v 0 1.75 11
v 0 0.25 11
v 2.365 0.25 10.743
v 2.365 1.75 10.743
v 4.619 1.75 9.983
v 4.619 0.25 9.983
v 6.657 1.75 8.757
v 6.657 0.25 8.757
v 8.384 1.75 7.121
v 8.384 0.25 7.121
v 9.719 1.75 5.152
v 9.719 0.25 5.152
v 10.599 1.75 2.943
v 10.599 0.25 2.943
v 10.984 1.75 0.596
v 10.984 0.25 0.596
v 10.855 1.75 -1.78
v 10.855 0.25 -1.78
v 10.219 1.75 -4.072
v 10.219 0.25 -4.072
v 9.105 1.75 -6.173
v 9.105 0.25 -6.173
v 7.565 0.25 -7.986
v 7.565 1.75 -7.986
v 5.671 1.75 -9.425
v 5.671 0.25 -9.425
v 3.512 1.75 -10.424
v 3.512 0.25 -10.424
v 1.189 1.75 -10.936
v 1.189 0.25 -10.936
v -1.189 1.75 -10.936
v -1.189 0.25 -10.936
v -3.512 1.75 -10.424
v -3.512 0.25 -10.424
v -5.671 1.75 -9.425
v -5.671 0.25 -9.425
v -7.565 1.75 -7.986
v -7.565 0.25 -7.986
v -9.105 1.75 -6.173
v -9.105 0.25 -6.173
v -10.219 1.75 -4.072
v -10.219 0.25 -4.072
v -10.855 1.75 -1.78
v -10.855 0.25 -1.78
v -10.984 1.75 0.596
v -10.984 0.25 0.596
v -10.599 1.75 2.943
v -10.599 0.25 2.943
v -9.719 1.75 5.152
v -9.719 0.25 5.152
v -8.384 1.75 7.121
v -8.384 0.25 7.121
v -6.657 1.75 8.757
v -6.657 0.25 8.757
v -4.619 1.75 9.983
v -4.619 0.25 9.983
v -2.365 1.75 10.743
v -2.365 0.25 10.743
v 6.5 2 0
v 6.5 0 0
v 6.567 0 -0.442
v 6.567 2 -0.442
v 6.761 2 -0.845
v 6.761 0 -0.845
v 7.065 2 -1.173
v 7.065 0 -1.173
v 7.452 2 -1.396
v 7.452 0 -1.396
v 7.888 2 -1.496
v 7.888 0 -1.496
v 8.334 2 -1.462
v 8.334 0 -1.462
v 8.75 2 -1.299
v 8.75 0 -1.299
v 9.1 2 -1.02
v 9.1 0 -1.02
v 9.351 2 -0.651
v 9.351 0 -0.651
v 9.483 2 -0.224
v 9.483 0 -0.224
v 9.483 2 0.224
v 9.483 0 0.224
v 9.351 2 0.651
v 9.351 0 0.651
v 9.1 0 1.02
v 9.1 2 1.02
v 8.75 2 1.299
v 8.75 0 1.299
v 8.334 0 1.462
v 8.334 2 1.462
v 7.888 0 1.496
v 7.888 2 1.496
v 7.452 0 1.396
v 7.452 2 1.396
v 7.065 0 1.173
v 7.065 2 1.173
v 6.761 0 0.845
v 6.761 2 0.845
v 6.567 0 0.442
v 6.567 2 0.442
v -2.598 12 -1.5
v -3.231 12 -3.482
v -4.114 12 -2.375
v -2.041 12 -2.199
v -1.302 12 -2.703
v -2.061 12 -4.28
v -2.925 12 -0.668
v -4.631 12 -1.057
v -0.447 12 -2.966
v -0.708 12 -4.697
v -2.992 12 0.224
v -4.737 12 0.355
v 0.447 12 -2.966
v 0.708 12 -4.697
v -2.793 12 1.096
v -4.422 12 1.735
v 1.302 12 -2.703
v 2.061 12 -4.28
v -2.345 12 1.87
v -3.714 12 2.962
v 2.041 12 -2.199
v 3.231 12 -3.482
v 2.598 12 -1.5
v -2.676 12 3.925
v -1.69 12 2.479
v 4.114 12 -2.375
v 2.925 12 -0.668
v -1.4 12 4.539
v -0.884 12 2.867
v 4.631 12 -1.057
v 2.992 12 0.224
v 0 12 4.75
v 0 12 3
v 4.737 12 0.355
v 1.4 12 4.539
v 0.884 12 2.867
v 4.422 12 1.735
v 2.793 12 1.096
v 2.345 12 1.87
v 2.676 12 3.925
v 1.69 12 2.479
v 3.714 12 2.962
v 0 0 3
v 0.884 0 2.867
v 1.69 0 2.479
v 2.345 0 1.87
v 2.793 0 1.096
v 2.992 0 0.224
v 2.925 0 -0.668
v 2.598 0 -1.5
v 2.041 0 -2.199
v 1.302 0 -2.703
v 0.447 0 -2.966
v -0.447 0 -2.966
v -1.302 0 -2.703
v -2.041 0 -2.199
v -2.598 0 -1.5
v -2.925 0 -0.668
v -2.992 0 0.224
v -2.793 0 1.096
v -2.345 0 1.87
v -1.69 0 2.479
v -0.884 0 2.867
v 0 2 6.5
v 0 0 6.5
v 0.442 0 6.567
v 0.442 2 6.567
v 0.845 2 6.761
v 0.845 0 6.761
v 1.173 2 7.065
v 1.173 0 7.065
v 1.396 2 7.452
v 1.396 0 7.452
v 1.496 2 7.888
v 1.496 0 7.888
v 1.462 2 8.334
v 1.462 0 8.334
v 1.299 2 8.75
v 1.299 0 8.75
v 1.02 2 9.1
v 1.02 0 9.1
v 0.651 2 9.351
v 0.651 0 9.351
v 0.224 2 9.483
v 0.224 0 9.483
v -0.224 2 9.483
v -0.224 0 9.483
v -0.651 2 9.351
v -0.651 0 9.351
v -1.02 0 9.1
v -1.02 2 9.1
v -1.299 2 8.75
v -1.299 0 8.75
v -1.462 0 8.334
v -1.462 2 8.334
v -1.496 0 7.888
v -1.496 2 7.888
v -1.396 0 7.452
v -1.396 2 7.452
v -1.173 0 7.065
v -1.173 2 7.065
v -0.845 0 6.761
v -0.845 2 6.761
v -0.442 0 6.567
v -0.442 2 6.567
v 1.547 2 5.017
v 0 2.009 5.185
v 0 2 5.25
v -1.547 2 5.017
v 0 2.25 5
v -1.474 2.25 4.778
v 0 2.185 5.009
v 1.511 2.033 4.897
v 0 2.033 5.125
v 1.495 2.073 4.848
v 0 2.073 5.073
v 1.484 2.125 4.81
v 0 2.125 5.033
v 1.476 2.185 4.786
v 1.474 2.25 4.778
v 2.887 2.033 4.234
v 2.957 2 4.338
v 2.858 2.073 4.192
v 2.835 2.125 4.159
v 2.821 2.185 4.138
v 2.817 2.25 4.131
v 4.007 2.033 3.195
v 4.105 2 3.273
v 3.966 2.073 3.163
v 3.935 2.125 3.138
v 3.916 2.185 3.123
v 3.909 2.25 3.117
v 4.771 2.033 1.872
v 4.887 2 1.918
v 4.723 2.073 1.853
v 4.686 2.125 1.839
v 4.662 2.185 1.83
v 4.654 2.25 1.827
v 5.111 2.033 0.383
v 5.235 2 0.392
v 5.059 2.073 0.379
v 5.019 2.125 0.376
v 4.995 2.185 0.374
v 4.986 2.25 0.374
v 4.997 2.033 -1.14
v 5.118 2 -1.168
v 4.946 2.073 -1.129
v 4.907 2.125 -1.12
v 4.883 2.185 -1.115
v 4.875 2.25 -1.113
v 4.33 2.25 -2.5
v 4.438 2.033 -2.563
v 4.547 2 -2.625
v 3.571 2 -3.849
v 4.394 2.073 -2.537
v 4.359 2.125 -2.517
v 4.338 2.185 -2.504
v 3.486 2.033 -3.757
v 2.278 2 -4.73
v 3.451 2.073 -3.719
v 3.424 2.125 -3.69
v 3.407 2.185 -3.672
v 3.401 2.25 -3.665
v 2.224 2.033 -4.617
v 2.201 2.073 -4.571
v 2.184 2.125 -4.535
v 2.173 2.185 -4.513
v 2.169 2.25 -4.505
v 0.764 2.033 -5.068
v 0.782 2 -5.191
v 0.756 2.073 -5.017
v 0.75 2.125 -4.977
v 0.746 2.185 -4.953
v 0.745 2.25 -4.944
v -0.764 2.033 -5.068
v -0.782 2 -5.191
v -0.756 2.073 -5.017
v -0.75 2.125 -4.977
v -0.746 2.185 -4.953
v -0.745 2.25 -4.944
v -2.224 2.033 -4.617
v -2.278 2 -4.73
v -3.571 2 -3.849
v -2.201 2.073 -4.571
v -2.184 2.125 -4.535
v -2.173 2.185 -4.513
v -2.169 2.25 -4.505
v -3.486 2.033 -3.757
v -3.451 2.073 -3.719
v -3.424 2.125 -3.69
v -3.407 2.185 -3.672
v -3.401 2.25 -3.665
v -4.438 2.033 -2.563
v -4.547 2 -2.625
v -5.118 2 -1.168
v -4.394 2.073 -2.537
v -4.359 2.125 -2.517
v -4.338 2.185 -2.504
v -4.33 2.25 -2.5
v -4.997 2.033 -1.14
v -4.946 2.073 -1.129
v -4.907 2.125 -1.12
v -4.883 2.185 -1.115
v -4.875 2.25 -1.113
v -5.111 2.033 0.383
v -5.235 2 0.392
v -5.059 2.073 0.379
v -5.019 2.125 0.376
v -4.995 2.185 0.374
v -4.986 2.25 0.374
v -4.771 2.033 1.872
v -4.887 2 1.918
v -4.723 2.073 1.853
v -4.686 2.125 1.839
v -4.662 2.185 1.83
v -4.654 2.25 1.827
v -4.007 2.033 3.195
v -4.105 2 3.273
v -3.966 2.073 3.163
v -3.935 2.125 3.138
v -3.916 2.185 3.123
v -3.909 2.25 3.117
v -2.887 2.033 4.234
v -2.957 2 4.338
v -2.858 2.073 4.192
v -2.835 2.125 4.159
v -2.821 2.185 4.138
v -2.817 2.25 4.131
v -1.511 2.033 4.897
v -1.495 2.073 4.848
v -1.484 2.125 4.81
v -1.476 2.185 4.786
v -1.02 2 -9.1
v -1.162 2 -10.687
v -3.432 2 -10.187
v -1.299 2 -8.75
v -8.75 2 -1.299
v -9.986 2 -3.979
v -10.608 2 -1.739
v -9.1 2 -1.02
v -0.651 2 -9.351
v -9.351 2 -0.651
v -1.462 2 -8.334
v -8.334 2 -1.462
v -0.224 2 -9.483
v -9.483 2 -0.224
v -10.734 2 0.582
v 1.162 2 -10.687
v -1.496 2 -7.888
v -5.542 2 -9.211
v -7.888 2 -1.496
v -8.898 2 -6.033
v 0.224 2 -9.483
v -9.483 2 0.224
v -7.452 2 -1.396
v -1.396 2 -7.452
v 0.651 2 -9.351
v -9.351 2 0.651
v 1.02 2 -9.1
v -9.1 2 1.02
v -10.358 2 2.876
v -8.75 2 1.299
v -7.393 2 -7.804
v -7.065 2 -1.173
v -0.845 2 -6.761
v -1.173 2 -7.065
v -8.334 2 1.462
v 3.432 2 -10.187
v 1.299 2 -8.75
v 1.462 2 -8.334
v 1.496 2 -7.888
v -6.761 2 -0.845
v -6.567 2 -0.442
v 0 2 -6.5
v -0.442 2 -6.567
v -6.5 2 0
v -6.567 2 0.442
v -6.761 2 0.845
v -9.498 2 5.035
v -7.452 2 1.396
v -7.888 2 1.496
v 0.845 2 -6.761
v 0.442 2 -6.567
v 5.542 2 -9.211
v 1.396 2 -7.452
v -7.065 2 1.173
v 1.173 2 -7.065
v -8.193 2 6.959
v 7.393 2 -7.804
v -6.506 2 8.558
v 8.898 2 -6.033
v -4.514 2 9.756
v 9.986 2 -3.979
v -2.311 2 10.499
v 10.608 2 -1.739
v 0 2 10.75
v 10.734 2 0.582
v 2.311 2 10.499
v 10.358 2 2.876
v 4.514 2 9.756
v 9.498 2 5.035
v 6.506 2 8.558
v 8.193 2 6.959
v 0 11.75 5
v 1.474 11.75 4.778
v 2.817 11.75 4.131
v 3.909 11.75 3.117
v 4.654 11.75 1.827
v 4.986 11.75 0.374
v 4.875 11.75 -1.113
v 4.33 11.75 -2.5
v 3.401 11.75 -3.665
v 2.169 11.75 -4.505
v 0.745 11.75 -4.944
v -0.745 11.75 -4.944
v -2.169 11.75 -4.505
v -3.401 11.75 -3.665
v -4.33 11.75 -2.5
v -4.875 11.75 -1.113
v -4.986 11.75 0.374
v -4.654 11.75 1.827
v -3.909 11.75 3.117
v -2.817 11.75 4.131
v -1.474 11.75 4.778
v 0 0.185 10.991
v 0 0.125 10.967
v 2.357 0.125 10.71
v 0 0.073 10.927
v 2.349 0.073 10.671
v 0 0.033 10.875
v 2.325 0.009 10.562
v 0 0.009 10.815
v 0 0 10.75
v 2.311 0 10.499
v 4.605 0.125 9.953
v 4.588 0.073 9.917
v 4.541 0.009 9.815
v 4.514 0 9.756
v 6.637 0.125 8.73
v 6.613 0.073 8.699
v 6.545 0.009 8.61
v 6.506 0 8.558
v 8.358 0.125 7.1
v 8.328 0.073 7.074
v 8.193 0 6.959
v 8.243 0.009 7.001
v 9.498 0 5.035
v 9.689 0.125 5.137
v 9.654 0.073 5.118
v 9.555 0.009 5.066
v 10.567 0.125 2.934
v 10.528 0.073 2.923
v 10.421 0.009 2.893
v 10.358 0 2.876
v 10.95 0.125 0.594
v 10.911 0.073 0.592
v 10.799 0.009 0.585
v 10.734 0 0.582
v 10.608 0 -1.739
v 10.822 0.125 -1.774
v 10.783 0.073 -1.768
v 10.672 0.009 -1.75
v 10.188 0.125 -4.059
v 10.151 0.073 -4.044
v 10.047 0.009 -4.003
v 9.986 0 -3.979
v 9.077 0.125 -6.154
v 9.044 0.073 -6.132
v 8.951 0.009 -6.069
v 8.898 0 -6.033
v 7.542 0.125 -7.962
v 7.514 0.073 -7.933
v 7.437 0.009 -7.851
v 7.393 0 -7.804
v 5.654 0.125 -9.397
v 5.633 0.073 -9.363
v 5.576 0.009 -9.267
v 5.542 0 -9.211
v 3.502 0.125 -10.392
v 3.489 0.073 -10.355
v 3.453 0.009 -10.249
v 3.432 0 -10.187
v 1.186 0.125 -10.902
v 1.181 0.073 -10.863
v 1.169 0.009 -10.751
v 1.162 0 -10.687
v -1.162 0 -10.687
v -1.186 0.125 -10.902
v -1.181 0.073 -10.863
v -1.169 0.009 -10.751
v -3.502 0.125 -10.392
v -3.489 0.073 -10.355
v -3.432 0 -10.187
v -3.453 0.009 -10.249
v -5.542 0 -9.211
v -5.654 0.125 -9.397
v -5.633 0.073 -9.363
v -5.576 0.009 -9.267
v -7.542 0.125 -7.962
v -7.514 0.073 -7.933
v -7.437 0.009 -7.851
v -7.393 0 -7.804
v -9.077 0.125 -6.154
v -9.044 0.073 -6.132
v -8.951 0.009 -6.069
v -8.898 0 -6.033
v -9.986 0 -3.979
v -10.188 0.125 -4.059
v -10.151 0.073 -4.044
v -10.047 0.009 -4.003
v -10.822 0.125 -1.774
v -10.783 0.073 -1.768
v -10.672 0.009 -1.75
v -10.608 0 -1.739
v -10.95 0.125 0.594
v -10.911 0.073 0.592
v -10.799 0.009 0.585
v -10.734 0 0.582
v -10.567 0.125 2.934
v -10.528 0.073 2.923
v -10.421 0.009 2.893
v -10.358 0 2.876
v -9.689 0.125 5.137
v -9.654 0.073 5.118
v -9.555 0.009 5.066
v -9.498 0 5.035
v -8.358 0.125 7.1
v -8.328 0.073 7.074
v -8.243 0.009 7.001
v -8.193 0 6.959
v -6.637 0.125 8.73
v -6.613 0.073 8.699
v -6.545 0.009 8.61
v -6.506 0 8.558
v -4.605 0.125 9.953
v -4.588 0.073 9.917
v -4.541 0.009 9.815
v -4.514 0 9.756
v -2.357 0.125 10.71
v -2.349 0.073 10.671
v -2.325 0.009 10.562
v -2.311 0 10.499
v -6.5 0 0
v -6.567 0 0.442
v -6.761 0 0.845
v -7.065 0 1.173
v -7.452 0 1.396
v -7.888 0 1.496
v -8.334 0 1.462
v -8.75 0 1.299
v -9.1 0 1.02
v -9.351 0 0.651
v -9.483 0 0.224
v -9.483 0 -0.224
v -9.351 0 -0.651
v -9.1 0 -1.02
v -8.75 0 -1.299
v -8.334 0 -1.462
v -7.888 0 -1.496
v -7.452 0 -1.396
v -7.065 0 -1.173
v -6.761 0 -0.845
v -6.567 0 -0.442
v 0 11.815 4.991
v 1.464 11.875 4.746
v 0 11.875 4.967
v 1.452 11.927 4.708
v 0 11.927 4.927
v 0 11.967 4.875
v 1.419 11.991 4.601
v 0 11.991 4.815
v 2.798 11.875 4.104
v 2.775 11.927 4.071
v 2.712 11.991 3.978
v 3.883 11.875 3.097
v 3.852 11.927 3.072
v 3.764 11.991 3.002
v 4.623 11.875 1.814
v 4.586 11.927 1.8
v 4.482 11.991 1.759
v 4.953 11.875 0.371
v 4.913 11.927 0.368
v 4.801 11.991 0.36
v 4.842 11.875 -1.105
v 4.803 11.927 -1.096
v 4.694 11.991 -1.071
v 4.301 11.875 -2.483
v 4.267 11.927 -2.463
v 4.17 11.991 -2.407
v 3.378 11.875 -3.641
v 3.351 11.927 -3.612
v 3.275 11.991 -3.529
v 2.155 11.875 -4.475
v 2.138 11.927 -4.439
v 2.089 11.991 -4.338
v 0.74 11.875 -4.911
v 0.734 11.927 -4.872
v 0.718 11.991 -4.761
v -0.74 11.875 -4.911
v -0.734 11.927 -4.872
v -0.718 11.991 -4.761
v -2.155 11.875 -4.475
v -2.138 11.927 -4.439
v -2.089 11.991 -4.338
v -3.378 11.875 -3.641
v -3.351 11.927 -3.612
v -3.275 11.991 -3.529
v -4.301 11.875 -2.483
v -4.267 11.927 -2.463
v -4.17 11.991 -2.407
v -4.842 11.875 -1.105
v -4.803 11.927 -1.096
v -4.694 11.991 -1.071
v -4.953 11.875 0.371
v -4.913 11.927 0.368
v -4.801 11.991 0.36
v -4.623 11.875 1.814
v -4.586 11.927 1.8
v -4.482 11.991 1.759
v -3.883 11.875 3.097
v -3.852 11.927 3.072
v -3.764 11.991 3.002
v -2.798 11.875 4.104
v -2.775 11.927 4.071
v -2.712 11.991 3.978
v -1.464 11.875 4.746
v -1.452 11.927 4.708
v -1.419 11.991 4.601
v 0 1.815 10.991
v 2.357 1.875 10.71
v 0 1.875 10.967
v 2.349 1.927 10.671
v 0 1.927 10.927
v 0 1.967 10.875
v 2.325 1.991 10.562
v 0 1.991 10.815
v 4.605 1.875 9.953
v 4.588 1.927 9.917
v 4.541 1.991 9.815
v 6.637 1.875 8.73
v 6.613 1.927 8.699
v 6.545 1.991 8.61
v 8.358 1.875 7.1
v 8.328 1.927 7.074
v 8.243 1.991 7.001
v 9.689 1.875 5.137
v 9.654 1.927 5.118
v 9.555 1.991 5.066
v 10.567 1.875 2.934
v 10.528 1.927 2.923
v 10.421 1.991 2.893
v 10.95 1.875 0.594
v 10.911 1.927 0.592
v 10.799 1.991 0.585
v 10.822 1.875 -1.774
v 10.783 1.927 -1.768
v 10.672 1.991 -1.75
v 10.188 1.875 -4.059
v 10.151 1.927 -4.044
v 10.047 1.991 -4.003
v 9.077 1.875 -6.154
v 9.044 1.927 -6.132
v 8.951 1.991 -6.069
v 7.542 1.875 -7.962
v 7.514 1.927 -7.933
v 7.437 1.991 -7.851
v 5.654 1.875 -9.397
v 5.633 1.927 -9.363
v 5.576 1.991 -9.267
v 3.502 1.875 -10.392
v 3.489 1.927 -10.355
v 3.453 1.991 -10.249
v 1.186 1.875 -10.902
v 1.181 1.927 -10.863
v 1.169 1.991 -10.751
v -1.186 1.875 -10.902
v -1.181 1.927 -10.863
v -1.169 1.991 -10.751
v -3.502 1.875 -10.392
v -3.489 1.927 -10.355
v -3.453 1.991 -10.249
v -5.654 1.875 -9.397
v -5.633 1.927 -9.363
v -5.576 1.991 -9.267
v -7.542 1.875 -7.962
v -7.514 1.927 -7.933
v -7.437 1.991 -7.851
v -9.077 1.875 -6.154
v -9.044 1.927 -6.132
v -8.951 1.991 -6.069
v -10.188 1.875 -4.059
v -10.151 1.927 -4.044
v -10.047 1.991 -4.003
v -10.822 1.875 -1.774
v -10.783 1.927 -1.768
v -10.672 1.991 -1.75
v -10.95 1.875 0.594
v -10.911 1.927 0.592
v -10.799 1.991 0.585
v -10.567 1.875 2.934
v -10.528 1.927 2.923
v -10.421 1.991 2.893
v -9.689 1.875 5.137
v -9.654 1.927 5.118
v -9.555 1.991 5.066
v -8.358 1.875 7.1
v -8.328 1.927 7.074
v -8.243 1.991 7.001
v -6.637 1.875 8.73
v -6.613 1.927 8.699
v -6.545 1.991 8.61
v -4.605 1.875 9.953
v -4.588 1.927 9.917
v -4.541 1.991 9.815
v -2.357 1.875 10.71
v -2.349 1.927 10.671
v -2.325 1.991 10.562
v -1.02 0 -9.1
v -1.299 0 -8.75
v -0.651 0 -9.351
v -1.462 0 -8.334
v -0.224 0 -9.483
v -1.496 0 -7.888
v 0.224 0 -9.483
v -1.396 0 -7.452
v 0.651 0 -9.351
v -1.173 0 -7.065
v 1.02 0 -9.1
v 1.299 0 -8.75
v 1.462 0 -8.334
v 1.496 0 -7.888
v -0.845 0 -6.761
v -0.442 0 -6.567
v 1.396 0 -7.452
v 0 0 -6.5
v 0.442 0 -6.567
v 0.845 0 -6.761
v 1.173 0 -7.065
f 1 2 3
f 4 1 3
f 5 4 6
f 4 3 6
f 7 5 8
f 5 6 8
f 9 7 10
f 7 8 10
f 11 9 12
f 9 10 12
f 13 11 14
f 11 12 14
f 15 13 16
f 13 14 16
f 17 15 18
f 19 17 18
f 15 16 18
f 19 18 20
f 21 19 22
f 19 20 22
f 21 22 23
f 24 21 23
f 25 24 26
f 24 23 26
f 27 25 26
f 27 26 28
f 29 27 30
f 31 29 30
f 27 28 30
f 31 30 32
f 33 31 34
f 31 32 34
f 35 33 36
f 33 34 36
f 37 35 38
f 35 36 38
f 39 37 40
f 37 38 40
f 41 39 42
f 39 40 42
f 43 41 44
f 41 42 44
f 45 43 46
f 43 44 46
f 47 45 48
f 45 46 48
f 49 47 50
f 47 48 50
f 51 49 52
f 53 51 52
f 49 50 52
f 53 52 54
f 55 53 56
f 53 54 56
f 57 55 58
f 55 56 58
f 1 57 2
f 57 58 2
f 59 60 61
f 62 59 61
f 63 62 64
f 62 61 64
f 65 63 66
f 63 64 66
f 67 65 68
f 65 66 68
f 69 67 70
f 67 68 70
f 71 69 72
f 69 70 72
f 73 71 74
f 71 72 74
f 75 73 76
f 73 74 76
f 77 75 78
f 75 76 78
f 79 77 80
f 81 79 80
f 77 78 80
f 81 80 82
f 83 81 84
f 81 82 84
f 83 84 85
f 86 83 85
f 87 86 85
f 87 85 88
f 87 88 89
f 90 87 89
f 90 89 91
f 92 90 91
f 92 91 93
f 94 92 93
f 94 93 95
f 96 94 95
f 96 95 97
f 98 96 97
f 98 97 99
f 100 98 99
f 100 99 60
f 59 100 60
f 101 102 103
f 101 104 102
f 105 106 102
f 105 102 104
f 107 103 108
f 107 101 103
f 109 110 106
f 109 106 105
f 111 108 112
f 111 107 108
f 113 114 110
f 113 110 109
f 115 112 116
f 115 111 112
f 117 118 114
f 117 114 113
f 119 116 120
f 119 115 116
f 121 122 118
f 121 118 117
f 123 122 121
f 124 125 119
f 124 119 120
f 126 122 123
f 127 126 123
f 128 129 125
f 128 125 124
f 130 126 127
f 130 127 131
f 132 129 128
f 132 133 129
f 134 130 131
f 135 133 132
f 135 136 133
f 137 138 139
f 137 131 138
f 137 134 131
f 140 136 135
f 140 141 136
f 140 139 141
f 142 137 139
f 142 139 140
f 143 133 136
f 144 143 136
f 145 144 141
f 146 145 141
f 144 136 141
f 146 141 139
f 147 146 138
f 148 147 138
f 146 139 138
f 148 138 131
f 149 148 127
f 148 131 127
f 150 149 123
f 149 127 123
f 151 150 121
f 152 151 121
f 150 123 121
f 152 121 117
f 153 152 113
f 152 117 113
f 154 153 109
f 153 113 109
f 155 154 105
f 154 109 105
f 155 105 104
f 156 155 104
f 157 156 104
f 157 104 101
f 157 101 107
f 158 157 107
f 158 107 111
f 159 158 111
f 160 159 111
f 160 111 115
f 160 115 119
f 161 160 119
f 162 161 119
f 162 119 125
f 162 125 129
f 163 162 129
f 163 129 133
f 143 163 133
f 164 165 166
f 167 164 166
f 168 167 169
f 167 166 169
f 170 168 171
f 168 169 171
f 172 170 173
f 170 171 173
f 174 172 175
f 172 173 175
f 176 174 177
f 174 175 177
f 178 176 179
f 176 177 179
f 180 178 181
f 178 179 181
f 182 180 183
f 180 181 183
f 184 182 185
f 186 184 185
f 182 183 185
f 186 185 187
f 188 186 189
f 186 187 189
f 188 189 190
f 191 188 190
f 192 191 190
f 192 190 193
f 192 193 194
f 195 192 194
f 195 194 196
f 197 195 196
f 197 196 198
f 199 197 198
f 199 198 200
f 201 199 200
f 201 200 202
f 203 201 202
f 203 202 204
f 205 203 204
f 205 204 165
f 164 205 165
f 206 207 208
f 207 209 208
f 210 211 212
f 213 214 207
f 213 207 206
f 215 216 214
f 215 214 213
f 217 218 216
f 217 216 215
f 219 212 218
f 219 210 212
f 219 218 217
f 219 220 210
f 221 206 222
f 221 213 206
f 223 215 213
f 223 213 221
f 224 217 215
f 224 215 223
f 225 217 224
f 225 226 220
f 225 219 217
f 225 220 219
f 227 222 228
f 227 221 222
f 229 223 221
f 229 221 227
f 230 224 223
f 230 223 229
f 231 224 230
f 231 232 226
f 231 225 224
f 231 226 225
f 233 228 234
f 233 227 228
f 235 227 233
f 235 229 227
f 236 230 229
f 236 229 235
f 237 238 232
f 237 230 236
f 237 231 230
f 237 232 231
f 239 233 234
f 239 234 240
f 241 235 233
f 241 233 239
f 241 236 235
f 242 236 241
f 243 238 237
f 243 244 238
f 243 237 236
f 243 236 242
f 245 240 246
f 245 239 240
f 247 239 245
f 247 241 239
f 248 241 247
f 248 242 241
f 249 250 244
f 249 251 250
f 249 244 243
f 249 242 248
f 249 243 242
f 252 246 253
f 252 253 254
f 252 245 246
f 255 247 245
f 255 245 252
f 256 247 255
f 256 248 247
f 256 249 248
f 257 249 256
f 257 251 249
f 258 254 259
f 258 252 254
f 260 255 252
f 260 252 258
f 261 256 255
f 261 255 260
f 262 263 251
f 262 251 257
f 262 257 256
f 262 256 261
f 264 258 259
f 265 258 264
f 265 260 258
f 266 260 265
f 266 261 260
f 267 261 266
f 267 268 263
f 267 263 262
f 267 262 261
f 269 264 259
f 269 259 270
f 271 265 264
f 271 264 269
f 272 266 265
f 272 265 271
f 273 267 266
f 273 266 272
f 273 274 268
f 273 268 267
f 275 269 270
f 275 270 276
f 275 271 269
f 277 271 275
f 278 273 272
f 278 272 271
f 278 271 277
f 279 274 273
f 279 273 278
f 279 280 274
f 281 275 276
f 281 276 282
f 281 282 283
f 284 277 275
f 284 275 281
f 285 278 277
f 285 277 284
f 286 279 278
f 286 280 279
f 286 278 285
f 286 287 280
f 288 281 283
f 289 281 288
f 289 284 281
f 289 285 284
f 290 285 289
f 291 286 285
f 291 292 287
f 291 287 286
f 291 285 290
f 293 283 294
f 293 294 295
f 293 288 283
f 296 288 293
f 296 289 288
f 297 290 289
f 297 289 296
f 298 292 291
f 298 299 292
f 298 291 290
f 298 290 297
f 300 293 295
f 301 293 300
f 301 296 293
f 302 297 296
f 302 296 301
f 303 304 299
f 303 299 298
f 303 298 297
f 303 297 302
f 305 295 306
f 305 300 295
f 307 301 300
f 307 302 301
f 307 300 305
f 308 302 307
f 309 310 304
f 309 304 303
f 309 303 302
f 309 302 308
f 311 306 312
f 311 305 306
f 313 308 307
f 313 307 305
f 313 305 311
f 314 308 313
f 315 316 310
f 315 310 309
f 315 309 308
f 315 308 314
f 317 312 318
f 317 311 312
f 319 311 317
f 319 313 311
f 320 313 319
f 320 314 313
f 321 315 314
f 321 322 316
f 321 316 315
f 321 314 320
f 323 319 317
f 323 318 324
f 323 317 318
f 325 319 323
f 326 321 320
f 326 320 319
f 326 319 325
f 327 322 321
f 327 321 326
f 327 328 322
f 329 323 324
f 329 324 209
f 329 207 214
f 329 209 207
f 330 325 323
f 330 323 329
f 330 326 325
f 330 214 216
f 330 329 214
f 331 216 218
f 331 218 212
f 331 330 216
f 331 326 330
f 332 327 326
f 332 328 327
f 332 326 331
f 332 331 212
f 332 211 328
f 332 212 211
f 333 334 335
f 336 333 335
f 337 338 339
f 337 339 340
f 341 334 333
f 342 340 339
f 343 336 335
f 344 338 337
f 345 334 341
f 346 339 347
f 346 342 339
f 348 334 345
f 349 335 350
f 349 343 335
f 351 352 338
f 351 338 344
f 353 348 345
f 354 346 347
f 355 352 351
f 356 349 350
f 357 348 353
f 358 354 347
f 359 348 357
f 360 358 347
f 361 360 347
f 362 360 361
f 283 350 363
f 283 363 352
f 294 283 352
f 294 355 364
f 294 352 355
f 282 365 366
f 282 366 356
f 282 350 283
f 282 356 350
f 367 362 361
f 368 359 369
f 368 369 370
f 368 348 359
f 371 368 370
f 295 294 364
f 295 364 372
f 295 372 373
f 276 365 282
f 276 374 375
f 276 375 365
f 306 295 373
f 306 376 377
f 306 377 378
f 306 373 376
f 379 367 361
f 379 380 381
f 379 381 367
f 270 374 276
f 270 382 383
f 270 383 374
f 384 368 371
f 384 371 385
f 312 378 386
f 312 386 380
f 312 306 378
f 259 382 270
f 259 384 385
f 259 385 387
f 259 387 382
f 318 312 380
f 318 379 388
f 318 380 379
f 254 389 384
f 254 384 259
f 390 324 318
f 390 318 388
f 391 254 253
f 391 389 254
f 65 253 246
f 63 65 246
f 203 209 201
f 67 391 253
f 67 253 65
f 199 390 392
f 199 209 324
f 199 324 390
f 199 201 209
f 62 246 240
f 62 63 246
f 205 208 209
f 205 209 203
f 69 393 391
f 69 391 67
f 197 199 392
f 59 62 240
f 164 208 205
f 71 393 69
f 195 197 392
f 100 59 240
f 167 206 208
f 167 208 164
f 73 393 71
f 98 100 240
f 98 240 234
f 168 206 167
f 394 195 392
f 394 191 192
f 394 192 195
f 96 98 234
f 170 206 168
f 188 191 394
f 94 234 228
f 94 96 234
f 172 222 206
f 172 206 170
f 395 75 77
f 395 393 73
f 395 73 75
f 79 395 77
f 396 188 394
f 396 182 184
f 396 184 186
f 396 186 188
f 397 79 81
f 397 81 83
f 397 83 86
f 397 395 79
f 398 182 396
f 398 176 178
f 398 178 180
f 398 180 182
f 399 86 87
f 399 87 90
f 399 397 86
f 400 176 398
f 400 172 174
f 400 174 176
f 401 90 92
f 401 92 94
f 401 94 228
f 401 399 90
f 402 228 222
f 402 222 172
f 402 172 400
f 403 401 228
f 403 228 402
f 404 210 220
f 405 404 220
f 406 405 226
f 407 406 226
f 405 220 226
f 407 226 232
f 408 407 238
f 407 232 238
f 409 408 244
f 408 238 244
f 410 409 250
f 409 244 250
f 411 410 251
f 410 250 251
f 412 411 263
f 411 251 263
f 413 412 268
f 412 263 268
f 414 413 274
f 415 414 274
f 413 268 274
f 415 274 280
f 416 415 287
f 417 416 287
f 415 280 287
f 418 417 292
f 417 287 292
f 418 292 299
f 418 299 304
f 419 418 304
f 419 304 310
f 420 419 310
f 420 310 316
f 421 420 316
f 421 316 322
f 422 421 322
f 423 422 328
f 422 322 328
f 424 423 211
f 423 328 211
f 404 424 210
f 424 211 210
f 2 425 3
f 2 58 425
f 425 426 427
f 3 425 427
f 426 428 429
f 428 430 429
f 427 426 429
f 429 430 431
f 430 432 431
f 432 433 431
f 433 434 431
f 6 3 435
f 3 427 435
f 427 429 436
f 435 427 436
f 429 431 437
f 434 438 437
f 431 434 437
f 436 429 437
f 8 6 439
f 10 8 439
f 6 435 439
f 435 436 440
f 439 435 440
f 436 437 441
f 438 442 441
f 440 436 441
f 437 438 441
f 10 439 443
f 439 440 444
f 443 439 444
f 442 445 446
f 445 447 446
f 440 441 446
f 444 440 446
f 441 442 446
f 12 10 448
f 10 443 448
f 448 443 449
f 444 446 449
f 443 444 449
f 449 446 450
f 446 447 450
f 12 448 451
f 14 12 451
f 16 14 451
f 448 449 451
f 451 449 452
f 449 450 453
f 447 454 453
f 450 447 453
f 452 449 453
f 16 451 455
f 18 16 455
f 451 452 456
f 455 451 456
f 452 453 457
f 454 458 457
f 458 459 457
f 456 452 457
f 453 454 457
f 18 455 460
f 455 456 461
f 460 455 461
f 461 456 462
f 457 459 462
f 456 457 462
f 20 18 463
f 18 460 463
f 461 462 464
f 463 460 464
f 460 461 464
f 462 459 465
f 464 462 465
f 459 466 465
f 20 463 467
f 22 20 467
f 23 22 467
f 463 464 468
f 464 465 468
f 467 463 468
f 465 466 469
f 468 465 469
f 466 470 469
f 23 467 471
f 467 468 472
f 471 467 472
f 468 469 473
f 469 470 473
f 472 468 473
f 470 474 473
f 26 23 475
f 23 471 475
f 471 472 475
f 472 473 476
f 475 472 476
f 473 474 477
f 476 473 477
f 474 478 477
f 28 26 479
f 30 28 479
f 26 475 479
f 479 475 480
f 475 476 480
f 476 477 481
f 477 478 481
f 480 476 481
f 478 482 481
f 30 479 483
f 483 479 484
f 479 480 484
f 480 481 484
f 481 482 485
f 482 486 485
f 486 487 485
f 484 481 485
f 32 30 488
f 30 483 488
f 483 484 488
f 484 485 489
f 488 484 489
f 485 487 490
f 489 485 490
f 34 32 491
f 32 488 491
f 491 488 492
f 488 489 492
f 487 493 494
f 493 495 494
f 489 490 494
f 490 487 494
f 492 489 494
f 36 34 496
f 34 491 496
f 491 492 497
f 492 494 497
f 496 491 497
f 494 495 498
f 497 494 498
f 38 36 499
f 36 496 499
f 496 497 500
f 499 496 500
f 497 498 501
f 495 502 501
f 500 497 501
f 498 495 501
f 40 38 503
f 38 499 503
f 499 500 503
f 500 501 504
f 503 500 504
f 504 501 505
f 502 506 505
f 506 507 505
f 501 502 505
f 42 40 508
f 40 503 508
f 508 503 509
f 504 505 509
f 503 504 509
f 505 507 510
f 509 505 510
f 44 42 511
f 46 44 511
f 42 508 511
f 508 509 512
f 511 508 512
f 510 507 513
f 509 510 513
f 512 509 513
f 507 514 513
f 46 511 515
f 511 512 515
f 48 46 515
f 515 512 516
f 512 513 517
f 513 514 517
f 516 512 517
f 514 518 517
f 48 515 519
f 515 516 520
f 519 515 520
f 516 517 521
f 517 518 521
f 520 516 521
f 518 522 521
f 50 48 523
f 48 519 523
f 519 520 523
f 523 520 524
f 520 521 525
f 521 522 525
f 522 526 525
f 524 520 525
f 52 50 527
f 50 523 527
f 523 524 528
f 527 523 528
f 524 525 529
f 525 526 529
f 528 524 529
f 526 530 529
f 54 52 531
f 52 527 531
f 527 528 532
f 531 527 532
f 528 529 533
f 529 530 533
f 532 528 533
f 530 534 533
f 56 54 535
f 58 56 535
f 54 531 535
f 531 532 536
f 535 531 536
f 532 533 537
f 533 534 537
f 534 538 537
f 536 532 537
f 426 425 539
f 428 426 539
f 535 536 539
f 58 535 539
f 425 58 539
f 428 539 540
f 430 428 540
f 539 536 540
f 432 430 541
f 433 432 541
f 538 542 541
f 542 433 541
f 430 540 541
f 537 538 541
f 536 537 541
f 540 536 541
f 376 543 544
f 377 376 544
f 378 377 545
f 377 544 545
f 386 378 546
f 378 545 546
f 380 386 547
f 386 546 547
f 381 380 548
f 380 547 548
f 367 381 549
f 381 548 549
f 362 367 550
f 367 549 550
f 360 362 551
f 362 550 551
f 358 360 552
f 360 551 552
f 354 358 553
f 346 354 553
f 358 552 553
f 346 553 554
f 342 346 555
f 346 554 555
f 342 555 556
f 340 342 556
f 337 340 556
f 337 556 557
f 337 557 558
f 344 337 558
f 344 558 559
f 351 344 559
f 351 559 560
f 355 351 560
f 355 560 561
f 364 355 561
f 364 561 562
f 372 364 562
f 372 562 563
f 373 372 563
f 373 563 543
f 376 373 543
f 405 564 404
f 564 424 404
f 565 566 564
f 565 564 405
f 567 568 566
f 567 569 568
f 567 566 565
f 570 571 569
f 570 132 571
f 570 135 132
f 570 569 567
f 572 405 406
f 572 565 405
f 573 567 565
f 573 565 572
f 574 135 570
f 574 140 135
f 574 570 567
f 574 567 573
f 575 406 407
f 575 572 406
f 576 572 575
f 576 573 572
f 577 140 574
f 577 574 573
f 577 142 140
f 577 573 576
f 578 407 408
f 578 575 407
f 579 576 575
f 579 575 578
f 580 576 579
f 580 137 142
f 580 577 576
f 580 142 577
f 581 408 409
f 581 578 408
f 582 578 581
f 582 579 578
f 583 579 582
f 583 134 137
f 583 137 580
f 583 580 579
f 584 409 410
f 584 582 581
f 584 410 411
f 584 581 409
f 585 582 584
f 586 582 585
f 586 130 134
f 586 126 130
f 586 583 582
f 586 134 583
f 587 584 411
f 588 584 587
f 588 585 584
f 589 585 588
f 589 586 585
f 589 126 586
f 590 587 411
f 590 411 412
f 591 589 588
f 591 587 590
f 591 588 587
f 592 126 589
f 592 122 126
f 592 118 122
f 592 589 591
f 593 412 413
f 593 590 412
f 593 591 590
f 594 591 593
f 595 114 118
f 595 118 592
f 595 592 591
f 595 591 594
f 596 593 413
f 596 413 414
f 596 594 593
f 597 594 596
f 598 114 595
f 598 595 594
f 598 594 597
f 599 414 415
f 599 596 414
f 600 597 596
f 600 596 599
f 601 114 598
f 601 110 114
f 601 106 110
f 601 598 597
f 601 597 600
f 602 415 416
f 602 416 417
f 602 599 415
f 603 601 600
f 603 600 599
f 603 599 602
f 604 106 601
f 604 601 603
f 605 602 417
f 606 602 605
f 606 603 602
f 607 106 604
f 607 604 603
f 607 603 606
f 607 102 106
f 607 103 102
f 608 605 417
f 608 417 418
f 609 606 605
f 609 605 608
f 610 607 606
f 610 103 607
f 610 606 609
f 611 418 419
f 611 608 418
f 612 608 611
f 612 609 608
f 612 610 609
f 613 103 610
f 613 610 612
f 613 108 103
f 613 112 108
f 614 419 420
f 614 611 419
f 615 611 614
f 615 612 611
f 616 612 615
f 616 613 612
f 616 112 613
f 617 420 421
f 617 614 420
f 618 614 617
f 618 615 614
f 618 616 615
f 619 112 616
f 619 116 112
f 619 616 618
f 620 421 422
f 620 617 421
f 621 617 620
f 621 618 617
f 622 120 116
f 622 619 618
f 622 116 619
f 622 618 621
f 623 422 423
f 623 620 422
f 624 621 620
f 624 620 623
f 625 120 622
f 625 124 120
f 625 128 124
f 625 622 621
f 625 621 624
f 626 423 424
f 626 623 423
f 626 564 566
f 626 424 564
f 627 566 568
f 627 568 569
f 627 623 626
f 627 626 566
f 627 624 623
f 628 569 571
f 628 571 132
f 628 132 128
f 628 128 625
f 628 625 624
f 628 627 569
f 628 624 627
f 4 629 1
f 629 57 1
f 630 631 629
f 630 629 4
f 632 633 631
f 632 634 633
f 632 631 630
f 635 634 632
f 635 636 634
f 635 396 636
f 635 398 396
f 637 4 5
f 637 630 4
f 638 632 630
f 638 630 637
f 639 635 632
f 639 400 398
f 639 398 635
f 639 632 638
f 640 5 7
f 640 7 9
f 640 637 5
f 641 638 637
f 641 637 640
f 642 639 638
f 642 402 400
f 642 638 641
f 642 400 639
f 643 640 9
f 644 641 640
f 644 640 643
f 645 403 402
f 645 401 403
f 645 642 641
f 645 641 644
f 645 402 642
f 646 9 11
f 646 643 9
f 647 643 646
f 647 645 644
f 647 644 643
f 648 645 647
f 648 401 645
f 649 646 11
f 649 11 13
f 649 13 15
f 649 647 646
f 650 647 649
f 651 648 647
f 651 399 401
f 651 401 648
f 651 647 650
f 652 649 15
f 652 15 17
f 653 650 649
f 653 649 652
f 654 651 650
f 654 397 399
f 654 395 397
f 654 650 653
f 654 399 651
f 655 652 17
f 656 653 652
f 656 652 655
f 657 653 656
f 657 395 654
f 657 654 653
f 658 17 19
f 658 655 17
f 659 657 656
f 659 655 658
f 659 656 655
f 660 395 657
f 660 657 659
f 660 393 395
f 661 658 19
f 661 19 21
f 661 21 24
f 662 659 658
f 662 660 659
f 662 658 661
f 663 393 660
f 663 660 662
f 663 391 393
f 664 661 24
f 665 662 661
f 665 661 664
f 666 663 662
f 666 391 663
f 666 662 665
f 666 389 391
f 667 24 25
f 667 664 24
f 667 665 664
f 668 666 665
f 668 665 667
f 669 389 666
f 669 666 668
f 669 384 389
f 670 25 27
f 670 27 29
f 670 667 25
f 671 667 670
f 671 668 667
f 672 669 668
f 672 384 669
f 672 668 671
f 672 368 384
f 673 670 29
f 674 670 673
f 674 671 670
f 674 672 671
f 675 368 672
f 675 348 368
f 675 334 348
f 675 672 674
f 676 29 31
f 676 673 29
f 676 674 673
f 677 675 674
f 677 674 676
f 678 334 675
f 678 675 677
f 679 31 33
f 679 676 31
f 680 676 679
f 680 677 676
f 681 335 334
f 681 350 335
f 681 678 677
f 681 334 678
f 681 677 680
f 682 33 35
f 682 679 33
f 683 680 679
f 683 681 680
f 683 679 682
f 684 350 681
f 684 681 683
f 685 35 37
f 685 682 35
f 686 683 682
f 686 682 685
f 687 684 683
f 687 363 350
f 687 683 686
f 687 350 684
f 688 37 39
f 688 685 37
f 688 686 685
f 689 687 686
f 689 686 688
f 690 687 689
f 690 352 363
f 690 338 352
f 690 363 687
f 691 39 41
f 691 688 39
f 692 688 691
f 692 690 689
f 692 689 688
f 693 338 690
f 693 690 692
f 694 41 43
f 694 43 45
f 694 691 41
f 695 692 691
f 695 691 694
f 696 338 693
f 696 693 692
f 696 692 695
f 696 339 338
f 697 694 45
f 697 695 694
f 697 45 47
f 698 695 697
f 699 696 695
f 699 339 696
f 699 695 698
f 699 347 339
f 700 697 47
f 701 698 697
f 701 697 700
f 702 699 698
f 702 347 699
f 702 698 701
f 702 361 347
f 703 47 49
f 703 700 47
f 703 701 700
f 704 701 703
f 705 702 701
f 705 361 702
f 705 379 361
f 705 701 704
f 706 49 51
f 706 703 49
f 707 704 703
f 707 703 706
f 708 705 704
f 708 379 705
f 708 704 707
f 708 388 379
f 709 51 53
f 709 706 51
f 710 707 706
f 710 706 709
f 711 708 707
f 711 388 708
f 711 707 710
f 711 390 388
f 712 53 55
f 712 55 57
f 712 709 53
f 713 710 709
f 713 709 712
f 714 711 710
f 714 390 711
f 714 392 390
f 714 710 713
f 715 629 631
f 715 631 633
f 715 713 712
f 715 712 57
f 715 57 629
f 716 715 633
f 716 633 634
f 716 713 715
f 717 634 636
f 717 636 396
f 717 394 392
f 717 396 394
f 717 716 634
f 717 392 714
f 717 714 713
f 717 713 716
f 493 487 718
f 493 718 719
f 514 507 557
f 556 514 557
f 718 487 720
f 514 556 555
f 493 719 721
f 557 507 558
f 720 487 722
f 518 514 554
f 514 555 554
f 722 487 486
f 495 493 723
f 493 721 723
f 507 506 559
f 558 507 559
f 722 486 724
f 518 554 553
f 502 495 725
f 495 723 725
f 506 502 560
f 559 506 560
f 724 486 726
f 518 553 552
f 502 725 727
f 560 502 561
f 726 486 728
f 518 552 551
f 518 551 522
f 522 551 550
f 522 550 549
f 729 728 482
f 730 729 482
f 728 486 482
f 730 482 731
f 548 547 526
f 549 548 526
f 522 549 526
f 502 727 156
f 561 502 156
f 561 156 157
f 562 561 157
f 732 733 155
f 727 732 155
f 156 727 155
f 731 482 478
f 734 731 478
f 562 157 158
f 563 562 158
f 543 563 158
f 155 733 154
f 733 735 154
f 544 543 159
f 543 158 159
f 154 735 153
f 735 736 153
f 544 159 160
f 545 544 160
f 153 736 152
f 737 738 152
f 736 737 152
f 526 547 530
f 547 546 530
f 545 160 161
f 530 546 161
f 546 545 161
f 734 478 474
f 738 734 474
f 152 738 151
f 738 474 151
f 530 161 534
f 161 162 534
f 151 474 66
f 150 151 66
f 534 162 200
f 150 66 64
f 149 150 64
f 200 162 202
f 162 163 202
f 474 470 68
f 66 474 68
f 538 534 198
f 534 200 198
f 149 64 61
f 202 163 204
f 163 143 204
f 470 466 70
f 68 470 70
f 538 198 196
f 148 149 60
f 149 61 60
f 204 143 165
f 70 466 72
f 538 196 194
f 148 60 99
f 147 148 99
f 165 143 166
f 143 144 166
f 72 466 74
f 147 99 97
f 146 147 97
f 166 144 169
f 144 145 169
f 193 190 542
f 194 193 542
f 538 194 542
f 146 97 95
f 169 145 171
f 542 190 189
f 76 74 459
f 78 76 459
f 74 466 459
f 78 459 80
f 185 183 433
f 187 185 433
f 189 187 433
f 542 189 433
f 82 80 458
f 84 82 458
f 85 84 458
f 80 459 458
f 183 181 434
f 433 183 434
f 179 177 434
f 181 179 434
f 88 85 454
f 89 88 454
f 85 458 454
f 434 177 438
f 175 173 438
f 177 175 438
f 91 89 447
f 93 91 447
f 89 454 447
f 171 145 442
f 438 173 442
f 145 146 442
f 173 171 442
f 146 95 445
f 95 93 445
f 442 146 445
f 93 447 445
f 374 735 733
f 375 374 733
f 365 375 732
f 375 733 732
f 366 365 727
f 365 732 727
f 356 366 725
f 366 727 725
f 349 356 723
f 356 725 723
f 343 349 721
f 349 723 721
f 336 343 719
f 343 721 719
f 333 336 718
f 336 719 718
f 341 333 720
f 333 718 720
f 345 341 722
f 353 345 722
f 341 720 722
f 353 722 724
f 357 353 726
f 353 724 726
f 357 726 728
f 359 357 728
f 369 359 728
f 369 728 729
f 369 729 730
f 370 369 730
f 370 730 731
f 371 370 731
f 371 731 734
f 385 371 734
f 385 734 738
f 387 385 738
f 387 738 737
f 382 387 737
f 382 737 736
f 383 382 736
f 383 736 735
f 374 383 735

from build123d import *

# Parameters (mm, degrees)
SKETCH_1_R               = 11
EXTRUDE_1_DEPTH          = 2
SKETCH_2_R               = 5
EXTRUDE_2_DEPTH          = 10
SKETCH_3_R               = 3
CUT_EXTRUDE_1_DEPTH      = 20.646882704
SKETCH_4_R               = 1.5
CUT_EXTRUDE_2_DEPTH      = 20.646882704
PATTERN_CIRCULAR_1_COUNT = 4
FILLET_1_R               = 0.25


with BuildPart() as part:
    # ｽｹｯﾁ1 → ﾎﾞｽ - 押し出し1 (new body)
    with BuildSketch(Plane(origin=(0, 0, 0), x_dir=(1, 0, 0), z_dir=(0, 1, 0))):
        with Locations(Location((0, 0, 0), (0, 0, 270))):
            Circle(SKETCH_1_R)
    extrude(amount=EXTRUDE_1_DEPTH)

    # ｽｹｯﾁ2 → ﾎﾞｽ - 押し出し2 (add)
    with BuildSketch(Plane(origin=(0, 2, 0), x_dir=(1, 0, 0), z_dir=(0, 1, 0))):
        with Locations(Location((0, 0, 0), (0, 0, 270))):
            Circle(SKETCH_2_R)
    extrude(amount=EXTRUDE_2_DEPTH)

    # ｽｹｯﾁ3 → ｶｯﾄ - 押し出し1 (cut, through all)
    with BuildSketch(Plane(origin=(0, 12, 0), x_dir=(1, 0, 0), z_dir=(0, 1, 0))):
        with Locations(Location((0, 0, 0), (0, 0, 270))):
            Circle(SKETCH_3_R)
    extrude(amount=-CUT_EXTRUDE_1_DEPTH, mode=Mode.SUBTRACT)

    # ｽｹｯﾁ4 → ｶｯﾄ - 押し出し2 (cut, through all)
    with BuildSketch(Plane.XZ):
        with Locations(Location((0, 8, 0), (0, 0, 270))):
            Circle(SKETCH_4_R)
    cut_extrude_2 = extrude(amount=-CUT_EXTRUDE_2_DEPTH, mode=Mode.SUBTRACT)

    # 円形ﾊﾟﾀｰﾝ1: ｶｯﾄ - 押し出し2 ×4 about axis
    pattern_circular_1_axis = Axis((0, 0, 0), (0, 1, 0))
    for i in range(1, PATTERN_CIRCULAR_1_COUNT):
        add(cut_extrude_2.rotate(pattern_circular_1_axis, i * 360 / PATTERN_CIRCULAR_1_COUNT), mode=Mode.SUBTRACT)

    # ﾌｨﾚｯﾄ1
    fillet_1_edges = [part.edges().sort_by_distance(p)[0] for p in [
        (0, 0, -11),
        (0, 2, -11),
        (0, 2, -5),
        (0, 12, -5),
    ]]
    fillet(fillet_1_edges, radius=FILLET_1_R)


solid = part.part
